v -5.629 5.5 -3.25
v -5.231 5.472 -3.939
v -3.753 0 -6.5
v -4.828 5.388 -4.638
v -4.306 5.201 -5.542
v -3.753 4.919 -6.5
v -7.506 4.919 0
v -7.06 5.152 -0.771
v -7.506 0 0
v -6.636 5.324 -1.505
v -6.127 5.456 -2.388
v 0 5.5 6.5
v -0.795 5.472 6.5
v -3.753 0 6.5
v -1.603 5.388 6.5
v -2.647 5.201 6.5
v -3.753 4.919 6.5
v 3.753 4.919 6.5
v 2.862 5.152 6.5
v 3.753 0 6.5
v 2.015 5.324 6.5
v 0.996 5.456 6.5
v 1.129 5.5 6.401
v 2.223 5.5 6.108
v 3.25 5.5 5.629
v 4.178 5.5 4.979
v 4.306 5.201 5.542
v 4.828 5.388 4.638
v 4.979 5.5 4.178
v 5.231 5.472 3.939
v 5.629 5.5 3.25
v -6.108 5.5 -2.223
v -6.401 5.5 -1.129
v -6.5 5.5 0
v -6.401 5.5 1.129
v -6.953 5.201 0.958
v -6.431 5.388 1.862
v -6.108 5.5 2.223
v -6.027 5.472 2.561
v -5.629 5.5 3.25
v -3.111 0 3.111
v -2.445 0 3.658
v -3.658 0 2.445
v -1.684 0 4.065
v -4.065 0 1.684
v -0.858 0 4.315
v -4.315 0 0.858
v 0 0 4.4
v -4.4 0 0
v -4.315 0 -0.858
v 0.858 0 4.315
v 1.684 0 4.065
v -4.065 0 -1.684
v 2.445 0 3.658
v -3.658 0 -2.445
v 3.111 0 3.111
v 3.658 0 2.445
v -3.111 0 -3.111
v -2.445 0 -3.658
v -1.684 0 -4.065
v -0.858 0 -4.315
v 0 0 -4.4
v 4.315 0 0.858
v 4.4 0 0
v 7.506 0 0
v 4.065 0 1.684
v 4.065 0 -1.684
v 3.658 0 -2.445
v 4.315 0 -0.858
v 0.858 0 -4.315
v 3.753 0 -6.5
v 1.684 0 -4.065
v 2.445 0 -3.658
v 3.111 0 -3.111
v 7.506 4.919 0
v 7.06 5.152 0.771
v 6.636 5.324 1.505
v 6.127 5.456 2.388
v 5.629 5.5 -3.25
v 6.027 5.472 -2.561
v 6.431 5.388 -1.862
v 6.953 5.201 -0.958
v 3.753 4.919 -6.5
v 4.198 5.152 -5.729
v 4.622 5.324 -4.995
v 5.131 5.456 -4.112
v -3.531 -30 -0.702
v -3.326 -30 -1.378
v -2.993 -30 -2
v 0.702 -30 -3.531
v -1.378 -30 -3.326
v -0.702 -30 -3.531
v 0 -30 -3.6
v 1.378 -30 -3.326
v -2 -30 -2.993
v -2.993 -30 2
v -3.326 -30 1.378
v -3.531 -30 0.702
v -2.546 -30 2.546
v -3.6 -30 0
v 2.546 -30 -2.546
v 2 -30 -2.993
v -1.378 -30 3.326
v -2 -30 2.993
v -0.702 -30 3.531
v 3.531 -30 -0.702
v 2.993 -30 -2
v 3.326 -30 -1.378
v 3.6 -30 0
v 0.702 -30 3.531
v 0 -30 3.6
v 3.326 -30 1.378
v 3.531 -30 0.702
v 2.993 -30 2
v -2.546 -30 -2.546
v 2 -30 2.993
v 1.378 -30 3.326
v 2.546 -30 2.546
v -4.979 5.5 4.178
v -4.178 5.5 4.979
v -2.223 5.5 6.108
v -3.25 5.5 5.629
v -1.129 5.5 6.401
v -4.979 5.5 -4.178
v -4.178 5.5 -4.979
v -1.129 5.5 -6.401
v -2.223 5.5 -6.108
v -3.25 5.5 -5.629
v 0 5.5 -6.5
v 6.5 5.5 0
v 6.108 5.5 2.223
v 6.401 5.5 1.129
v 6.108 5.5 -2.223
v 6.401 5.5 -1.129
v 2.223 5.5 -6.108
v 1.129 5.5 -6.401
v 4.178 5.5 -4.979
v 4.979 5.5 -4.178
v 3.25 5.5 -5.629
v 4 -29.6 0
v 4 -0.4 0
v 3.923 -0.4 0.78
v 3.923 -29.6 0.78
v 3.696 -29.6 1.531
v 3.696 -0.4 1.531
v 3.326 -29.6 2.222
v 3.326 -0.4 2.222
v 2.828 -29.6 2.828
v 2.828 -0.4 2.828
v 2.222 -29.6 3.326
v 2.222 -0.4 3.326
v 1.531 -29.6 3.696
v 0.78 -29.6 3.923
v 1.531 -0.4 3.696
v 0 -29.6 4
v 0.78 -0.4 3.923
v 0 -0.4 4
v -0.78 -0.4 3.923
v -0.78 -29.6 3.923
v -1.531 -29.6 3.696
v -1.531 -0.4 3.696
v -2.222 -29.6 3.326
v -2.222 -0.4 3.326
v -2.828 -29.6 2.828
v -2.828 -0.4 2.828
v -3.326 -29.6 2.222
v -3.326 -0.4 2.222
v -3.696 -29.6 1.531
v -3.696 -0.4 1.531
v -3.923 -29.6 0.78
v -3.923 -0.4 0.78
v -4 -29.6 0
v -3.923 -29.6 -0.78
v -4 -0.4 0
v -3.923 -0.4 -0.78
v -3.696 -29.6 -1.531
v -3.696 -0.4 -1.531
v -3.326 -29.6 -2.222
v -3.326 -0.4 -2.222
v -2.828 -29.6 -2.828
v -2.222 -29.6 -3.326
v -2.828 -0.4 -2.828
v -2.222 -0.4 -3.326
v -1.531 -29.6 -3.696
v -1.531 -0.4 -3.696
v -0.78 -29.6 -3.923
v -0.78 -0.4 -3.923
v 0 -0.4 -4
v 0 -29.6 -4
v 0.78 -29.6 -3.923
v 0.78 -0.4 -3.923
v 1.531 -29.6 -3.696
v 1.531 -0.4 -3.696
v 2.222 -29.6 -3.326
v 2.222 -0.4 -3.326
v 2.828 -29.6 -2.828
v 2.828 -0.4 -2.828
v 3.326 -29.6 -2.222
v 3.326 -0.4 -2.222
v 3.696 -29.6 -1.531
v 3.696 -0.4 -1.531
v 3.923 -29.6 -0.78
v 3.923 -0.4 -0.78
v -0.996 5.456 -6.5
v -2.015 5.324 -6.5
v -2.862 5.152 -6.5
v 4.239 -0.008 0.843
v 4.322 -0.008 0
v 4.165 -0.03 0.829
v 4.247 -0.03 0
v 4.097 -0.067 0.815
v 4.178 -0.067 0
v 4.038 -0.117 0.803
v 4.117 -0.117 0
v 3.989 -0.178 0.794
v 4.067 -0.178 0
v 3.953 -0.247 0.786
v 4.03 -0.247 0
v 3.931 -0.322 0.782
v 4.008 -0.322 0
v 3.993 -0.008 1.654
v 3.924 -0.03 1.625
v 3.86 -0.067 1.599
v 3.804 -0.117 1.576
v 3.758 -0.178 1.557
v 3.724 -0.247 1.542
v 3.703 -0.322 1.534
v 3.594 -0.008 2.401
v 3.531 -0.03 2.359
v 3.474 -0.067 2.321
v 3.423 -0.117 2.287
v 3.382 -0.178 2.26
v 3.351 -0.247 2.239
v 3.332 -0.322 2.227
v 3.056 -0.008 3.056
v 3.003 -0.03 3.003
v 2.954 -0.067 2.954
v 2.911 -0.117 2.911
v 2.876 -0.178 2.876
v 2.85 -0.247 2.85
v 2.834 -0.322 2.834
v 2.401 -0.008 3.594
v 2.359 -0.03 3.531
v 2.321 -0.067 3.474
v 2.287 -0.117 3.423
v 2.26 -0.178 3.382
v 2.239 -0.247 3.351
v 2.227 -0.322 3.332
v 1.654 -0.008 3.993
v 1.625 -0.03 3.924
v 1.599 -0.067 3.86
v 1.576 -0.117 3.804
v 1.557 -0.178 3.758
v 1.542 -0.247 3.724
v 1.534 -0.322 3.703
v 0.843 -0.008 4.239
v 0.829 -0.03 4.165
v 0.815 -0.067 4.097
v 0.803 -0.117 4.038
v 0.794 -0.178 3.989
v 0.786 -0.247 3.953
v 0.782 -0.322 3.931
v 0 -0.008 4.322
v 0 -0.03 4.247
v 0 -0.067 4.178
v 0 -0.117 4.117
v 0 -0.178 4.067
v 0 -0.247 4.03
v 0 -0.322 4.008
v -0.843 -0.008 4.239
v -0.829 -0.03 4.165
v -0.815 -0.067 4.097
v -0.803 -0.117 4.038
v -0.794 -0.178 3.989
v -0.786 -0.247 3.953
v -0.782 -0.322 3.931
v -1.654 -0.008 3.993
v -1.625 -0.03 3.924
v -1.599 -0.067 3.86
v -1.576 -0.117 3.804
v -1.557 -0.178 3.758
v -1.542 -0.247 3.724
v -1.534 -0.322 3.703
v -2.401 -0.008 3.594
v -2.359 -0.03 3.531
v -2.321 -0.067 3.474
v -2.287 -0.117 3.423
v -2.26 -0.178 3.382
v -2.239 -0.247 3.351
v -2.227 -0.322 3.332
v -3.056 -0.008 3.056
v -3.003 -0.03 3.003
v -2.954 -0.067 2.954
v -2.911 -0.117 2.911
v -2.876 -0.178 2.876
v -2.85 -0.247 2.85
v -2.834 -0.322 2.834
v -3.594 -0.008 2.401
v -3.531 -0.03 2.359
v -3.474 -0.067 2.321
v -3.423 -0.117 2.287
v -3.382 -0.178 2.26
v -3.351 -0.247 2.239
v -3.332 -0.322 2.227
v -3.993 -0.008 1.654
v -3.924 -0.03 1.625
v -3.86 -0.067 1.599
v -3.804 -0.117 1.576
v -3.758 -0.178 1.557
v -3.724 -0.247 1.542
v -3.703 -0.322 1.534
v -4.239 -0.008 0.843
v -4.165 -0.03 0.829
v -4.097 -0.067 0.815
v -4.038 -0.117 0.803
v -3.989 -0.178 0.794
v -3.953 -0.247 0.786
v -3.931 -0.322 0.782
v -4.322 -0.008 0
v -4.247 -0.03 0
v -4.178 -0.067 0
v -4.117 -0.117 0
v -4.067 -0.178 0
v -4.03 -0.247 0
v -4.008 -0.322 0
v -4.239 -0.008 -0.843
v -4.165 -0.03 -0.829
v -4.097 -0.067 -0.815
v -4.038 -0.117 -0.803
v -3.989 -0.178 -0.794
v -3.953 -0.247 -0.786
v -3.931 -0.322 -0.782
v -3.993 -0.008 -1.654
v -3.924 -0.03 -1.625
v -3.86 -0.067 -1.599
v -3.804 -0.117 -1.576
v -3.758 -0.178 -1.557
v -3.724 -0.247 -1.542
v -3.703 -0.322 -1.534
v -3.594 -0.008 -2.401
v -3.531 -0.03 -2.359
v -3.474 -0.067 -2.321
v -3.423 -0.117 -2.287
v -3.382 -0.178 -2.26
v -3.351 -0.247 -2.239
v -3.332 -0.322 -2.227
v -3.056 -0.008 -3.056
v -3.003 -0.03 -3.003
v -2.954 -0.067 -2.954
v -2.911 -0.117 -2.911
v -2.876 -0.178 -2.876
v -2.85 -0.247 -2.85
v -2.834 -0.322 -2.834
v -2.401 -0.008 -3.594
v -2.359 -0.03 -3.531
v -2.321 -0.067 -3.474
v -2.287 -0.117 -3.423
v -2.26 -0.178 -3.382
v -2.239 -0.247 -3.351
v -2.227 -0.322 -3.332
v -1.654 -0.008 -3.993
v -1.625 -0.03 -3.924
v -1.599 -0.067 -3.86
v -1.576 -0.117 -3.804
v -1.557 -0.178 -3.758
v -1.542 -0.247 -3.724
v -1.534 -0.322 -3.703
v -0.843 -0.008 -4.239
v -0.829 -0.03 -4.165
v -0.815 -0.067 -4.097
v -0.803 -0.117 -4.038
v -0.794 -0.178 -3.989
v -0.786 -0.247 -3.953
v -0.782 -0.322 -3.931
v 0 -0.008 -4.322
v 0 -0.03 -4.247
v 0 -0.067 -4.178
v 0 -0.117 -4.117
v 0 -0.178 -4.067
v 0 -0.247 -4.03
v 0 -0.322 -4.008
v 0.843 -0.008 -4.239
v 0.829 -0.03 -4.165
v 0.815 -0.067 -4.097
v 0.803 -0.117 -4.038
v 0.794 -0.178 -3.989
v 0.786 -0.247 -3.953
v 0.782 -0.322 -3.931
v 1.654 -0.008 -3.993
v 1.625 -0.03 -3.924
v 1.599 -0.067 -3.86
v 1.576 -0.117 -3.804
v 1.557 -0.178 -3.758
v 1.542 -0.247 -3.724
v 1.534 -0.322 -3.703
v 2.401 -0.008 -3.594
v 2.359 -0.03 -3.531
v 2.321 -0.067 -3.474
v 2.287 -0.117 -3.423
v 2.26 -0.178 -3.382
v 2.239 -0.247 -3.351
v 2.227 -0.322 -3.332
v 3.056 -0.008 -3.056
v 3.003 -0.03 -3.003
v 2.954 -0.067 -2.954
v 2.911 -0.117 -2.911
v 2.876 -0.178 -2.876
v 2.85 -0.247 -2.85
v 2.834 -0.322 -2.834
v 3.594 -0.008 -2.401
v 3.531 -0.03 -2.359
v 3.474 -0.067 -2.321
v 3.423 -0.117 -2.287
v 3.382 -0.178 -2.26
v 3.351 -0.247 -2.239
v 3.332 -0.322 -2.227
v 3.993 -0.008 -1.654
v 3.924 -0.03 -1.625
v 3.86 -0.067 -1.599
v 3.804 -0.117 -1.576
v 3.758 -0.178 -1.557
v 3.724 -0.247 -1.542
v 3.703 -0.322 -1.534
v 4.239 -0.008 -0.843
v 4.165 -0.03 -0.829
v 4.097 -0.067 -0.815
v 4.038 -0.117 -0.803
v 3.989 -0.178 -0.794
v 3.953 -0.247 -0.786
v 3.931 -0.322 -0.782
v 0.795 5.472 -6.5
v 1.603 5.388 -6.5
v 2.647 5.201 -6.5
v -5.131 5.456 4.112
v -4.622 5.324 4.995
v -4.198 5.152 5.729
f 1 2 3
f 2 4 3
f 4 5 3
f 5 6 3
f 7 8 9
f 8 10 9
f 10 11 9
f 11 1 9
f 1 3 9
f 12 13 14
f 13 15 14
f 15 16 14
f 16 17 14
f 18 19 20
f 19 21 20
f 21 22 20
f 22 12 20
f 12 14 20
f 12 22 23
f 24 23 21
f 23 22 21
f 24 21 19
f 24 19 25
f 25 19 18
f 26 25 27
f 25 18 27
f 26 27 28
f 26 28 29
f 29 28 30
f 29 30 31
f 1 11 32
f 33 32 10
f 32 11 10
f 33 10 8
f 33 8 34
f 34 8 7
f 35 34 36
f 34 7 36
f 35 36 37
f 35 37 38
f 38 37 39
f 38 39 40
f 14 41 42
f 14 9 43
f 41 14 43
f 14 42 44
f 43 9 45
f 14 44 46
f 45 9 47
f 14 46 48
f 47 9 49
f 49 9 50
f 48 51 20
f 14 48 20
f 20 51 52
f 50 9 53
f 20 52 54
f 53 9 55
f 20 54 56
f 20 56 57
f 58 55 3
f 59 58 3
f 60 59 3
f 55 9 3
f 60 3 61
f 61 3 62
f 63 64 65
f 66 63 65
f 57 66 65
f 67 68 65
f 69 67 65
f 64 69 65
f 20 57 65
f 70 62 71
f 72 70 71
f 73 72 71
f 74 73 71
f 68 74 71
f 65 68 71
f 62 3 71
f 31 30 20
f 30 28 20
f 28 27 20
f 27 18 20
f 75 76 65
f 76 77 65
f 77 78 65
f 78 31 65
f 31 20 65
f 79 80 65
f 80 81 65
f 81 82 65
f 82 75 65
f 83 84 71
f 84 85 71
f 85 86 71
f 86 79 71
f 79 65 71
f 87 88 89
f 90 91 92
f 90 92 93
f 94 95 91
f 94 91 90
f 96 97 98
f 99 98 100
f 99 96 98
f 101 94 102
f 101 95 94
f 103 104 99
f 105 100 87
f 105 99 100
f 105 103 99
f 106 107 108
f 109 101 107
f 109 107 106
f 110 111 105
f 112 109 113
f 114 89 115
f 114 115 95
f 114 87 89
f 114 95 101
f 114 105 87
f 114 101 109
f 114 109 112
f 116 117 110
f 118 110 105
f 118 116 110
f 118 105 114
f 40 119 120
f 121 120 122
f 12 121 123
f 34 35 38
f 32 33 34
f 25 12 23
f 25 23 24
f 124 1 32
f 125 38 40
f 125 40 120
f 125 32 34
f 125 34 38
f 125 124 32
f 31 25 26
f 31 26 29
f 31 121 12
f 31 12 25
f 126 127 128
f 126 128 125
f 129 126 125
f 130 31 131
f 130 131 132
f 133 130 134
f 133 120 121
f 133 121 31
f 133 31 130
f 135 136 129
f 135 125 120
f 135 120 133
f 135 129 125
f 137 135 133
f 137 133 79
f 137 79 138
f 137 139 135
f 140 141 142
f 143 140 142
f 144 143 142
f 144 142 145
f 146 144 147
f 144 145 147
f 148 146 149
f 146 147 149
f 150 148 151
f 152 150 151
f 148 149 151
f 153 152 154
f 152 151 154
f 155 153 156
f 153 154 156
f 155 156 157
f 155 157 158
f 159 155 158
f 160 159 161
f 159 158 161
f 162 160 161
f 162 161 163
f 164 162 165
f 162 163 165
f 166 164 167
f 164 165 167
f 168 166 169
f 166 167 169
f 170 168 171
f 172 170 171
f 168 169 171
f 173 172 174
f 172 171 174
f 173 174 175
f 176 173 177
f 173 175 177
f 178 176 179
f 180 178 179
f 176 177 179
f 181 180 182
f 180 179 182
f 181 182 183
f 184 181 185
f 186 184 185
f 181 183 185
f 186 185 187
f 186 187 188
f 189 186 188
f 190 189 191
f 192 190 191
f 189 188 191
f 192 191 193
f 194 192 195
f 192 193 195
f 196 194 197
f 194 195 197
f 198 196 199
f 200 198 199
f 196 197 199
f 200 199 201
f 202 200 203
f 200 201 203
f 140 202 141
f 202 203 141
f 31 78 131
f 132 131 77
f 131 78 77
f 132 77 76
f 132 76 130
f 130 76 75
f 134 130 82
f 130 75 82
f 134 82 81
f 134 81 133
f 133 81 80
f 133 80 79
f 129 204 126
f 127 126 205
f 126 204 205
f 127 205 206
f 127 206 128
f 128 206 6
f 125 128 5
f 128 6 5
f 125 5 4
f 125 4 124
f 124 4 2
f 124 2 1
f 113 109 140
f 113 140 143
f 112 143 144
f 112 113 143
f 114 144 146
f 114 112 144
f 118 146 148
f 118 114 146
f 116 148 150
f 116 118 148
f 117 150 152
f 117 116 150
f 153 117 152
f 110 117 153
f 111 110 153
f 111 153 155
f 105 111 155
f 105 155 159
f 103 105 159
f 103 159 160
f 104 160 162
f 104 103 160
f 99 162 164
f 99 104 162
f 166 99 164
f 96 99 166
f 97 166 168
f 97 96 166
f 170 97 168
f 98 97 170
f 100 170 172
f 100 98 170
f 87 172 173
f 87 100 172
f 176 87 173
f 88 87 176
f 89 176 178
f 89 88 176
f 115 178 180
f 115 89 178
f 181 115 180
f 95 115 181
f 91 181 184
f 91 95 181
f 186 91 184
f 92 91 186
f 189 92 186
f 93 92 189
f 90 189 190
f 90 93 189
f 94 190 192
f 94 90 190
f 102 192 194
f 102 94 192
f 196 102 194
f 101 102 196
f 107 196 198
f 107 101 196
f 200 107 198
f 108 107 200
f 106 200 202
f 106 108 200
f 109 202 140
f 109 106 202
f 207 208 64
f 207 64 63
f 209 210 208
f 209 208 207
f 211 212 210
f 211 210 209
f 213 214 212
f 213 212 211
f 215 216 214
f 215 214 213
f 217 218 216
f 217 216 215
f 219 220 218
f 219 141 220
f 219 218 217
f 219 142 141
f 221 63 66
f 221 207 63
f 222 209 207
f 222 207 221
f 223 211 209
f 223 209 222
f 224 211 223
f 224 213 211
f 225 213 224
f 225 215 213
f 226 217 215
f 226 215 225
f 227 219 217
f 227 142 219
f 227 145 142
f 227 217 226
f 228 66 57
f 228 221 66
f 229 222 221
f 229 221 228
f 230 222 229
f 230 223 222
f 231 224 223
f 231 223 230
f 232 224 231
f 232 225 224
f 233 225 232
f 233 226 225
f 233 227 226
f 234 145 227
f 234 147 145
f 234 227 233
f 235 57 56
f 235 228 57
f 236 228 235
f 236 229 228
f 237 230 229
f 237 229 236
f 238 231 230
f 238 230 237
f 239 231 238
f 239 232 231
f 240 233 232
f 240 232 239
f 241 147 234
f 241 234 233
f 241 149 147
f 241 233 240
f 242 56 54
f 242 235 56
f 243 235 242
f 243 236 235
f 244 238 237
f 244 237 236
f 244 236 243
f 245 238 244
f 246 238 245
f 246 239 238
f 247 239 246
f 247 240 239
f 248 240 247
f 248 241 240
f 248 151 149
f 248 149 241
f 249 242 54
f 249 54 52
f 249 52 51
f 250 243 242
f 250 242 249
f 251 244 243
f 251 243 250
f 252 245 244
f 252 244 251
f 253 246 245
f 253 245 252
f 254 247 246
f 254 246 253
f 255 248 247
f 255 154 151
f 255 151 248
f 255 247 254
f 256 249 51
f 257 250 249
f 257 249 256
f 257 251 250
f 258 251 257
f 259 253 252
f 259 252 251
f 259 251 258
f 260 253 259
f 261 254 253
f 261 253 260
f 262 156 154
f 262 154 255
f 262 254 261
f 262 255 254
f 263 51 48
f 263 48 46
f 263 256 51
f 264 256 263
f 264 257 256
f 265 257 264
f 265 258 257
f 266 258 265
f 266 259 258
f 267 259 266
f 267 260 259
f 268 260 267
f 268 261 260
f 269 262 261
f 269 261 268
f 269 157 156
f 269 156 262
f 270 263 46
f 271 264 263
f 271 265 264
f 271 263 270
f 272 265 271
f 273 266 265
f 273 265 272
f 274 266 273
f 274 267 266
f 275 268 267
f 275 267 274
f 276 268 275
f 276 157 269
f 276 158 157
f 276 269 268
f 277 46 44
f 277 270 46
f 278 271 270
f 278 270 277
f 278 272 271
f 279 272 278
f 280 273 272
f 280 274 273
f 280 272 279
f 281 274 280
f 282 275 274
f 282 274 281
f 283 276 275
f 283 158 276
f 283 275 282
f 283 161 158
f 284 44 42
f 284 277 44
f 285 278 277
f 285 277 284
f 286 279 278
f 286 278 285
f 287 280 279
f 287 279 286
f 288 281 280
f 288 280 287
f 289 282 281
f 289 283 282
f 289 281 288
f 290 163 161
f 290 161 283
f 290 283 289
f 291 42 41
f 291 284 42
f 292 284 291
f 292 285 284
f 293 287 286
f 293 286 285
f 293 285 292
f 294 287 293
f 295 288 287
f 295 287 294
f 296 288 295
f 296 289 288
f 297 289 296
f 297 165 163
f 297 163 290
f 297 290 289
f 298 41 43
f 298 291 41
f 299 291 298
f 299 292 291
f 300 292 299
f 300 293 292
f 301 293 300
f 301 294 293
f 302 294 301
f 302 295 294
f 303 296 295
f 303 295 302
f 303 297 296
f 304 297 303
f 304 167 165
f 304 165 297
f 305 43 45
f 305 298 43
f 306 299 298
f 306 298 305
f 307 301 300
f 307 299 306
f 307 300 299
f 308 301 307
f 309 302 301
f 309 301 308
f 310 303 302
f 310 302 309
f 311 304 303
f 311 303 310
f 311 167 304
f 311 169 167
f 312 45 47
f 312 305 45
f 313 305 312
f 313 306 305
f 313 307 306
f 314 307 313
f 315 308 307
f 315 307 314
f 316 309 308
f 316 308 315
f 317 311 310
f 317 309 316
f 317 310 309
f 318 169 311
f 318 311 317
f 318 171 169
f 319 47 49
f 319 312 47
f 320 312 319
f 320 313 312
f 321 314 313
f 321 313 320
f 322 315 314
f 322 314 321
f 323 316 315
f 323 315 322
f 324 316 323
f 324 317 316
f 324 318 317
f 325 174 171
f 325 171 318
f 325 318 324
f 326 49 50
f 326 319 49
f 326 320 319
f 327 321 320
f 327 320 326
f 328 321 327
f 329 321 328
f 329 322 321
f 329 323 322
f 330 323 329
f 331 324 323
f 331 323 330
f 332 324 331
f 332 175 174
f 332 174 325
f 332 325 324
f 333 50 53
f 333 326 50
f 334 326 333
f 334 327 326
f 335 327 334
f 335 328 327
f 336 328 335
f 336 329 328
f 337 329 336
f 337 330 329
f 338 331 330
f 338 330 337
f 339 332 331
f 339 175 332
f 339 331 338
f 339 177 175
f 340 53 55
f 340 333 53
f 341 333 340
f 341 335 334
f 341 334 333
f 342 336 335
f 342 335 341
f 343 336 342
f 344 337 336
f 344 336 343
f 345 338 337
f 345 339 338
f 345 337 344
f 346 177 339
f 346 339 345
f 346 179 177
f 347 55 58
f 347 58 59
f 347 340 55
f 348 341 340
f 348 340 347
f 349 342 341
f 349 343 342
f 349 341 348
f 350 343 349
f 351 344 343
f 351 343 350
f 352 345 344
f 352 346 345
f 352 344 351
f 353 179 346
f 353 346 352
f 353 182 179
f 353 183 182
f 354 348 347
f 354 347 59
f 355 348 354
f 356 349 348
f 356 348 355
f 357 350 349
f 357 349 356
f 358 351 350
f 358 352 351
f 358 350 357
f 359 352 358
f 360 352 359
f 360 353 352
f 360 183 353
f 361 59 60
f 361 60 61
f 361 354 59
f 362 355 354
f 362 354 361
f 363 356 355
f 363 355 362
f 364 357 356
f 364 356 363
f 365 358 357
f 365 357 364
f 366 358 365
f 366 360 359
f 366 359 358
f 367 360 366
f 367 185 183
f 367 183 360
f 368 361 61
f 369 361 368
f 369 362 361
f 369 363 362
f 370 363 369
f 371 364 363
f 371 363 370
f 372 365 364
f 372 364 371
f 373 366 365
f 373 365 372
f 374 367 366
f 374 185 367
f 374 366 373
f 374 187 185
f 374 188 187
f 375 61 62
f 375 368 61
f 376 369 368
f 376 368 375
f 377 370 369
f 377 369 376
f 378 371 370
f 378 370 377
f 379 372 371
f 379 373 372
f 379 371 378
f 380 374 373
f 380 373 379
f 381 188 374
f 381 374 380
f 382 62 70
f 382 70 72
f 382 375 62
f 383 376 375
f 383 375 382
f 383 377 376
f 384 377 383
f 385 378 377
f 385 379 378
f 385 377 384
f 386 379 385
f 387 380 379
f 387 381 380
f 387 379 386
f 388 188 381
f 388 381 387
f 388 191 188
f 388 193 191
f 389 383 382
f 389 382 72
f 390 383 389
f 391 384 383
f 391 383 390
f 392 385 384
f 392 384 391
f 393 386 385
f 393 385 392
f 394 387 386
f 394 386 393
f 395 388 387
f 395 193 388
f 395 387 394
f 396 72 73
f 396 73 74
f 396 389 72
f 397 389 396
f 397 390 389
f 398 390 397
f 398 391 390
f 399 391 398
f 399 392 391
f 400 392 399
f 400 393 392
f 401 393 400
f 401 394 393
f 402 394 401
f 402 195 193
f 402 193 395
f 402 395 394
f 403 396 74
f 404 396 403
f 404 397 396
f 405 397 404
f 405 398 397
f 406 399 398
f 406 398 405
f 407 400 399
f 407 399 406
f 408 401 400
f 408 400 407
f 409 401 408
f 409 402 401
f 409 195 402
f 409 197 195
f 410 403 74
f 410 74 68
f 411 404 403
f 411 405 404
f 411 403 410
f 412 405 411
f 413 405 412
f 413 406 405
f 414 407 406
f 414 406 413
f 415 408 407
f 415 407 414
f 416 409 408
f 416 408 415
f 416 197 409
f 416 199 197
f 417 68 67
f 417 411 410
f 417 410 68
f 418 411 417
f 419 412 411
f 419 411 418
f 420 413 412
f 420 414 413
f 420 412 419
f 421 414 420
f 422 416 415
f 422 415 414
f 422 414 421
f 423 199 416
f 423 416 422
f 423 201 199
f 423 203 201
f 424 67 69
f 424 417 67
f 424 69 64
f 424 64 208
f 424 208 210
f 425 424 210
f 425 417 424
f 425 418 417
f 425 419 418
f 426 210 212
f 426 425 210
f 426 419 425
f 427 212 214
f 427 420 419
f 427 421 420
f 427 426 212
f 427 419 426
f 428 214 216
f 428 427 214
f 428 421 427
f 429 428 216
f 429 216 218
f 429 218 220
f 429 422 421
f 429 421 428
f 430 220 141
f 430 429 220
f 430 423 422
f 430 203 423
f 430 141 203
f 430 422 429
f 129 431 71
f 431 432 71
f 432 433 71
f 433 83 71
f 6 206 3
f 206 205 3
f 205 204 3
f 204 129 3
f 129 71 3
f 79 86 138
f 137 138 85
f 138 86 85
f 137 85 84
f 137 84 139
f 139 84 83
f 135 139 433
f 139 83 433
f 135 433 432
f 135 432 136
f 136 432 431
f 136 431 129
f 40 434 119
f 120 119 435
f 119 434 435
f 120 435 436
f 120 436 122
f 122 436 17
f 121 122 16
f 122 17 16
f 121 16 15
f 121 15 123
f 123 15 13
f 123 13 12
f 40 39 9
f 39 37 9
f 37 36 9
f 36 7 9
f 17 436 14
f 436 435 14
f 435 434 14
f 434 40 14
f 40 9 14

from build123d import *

# Parameters (mm, degrees)
BOSS_EXTRUDE1_DEPTH = 5.5
SKETCH2_R           = 4
BOSS_EXTRUDE2_DEPTH = 30
FILLET1_R           = 0.4
CHAMFER1_SIZE       = 0.4


with BuildPart() as part:
    # Sketch1 → Boss-Extrude1 (new body)
    with BuildSketch(Plane(origin=(0, 0, 0), x_dir=(1, 0, 0), z_dir=(0, 1, 0))):
        Polygon((-3.75277675, -6.5), (3.75277675, -6.5), (7.505553499, 0), (3.75277675, 6.5), (-3.75277675, 6.5), (-7.505553499, 0), align=None)
    extrude(amount=BOSS_EXTRUDE1_DEPTH)

    # Sketch2 → Boss-Extrude2 (add)
    with BuildSketch(Plane.XZ):
        Circle(SKETCH2_R)
    extrude(amount=BOSS_EXTRUDE2_DEPTH)

    # Fillet1
    fillet1_edges = [part.edges().sort_by_distance(p)[0] for p in [
        (-4, 0, 0),
    ]]
    fillet(fillet1_edges, radius=FILLET1_R)

    # Chamfer1
    chamfer1_edges = [part.edges().sort_by_distance(p)[0] for p in [
        (-4, -30, 0),
    ]]
    chamfer(chamfer1_edges, length=CHAMFER1_SIZE)

    # Sketch3 → Cut-Revolve1 (revolve, cut)
    with BuildSketch(Plane(origin=(0, 0, 0), x_dir=(0, 0, -1), z_dir=(1, 0, 0))):
        Polygon((6.5, 5.5), (16.319077894, -0.169047265), (16.319077894, 5.5), align=None)
    revolve(axis=Axis((0, 0, 0), (0, 1, 0)), mode=Mode.SUBTRACT)


solid = part.part
